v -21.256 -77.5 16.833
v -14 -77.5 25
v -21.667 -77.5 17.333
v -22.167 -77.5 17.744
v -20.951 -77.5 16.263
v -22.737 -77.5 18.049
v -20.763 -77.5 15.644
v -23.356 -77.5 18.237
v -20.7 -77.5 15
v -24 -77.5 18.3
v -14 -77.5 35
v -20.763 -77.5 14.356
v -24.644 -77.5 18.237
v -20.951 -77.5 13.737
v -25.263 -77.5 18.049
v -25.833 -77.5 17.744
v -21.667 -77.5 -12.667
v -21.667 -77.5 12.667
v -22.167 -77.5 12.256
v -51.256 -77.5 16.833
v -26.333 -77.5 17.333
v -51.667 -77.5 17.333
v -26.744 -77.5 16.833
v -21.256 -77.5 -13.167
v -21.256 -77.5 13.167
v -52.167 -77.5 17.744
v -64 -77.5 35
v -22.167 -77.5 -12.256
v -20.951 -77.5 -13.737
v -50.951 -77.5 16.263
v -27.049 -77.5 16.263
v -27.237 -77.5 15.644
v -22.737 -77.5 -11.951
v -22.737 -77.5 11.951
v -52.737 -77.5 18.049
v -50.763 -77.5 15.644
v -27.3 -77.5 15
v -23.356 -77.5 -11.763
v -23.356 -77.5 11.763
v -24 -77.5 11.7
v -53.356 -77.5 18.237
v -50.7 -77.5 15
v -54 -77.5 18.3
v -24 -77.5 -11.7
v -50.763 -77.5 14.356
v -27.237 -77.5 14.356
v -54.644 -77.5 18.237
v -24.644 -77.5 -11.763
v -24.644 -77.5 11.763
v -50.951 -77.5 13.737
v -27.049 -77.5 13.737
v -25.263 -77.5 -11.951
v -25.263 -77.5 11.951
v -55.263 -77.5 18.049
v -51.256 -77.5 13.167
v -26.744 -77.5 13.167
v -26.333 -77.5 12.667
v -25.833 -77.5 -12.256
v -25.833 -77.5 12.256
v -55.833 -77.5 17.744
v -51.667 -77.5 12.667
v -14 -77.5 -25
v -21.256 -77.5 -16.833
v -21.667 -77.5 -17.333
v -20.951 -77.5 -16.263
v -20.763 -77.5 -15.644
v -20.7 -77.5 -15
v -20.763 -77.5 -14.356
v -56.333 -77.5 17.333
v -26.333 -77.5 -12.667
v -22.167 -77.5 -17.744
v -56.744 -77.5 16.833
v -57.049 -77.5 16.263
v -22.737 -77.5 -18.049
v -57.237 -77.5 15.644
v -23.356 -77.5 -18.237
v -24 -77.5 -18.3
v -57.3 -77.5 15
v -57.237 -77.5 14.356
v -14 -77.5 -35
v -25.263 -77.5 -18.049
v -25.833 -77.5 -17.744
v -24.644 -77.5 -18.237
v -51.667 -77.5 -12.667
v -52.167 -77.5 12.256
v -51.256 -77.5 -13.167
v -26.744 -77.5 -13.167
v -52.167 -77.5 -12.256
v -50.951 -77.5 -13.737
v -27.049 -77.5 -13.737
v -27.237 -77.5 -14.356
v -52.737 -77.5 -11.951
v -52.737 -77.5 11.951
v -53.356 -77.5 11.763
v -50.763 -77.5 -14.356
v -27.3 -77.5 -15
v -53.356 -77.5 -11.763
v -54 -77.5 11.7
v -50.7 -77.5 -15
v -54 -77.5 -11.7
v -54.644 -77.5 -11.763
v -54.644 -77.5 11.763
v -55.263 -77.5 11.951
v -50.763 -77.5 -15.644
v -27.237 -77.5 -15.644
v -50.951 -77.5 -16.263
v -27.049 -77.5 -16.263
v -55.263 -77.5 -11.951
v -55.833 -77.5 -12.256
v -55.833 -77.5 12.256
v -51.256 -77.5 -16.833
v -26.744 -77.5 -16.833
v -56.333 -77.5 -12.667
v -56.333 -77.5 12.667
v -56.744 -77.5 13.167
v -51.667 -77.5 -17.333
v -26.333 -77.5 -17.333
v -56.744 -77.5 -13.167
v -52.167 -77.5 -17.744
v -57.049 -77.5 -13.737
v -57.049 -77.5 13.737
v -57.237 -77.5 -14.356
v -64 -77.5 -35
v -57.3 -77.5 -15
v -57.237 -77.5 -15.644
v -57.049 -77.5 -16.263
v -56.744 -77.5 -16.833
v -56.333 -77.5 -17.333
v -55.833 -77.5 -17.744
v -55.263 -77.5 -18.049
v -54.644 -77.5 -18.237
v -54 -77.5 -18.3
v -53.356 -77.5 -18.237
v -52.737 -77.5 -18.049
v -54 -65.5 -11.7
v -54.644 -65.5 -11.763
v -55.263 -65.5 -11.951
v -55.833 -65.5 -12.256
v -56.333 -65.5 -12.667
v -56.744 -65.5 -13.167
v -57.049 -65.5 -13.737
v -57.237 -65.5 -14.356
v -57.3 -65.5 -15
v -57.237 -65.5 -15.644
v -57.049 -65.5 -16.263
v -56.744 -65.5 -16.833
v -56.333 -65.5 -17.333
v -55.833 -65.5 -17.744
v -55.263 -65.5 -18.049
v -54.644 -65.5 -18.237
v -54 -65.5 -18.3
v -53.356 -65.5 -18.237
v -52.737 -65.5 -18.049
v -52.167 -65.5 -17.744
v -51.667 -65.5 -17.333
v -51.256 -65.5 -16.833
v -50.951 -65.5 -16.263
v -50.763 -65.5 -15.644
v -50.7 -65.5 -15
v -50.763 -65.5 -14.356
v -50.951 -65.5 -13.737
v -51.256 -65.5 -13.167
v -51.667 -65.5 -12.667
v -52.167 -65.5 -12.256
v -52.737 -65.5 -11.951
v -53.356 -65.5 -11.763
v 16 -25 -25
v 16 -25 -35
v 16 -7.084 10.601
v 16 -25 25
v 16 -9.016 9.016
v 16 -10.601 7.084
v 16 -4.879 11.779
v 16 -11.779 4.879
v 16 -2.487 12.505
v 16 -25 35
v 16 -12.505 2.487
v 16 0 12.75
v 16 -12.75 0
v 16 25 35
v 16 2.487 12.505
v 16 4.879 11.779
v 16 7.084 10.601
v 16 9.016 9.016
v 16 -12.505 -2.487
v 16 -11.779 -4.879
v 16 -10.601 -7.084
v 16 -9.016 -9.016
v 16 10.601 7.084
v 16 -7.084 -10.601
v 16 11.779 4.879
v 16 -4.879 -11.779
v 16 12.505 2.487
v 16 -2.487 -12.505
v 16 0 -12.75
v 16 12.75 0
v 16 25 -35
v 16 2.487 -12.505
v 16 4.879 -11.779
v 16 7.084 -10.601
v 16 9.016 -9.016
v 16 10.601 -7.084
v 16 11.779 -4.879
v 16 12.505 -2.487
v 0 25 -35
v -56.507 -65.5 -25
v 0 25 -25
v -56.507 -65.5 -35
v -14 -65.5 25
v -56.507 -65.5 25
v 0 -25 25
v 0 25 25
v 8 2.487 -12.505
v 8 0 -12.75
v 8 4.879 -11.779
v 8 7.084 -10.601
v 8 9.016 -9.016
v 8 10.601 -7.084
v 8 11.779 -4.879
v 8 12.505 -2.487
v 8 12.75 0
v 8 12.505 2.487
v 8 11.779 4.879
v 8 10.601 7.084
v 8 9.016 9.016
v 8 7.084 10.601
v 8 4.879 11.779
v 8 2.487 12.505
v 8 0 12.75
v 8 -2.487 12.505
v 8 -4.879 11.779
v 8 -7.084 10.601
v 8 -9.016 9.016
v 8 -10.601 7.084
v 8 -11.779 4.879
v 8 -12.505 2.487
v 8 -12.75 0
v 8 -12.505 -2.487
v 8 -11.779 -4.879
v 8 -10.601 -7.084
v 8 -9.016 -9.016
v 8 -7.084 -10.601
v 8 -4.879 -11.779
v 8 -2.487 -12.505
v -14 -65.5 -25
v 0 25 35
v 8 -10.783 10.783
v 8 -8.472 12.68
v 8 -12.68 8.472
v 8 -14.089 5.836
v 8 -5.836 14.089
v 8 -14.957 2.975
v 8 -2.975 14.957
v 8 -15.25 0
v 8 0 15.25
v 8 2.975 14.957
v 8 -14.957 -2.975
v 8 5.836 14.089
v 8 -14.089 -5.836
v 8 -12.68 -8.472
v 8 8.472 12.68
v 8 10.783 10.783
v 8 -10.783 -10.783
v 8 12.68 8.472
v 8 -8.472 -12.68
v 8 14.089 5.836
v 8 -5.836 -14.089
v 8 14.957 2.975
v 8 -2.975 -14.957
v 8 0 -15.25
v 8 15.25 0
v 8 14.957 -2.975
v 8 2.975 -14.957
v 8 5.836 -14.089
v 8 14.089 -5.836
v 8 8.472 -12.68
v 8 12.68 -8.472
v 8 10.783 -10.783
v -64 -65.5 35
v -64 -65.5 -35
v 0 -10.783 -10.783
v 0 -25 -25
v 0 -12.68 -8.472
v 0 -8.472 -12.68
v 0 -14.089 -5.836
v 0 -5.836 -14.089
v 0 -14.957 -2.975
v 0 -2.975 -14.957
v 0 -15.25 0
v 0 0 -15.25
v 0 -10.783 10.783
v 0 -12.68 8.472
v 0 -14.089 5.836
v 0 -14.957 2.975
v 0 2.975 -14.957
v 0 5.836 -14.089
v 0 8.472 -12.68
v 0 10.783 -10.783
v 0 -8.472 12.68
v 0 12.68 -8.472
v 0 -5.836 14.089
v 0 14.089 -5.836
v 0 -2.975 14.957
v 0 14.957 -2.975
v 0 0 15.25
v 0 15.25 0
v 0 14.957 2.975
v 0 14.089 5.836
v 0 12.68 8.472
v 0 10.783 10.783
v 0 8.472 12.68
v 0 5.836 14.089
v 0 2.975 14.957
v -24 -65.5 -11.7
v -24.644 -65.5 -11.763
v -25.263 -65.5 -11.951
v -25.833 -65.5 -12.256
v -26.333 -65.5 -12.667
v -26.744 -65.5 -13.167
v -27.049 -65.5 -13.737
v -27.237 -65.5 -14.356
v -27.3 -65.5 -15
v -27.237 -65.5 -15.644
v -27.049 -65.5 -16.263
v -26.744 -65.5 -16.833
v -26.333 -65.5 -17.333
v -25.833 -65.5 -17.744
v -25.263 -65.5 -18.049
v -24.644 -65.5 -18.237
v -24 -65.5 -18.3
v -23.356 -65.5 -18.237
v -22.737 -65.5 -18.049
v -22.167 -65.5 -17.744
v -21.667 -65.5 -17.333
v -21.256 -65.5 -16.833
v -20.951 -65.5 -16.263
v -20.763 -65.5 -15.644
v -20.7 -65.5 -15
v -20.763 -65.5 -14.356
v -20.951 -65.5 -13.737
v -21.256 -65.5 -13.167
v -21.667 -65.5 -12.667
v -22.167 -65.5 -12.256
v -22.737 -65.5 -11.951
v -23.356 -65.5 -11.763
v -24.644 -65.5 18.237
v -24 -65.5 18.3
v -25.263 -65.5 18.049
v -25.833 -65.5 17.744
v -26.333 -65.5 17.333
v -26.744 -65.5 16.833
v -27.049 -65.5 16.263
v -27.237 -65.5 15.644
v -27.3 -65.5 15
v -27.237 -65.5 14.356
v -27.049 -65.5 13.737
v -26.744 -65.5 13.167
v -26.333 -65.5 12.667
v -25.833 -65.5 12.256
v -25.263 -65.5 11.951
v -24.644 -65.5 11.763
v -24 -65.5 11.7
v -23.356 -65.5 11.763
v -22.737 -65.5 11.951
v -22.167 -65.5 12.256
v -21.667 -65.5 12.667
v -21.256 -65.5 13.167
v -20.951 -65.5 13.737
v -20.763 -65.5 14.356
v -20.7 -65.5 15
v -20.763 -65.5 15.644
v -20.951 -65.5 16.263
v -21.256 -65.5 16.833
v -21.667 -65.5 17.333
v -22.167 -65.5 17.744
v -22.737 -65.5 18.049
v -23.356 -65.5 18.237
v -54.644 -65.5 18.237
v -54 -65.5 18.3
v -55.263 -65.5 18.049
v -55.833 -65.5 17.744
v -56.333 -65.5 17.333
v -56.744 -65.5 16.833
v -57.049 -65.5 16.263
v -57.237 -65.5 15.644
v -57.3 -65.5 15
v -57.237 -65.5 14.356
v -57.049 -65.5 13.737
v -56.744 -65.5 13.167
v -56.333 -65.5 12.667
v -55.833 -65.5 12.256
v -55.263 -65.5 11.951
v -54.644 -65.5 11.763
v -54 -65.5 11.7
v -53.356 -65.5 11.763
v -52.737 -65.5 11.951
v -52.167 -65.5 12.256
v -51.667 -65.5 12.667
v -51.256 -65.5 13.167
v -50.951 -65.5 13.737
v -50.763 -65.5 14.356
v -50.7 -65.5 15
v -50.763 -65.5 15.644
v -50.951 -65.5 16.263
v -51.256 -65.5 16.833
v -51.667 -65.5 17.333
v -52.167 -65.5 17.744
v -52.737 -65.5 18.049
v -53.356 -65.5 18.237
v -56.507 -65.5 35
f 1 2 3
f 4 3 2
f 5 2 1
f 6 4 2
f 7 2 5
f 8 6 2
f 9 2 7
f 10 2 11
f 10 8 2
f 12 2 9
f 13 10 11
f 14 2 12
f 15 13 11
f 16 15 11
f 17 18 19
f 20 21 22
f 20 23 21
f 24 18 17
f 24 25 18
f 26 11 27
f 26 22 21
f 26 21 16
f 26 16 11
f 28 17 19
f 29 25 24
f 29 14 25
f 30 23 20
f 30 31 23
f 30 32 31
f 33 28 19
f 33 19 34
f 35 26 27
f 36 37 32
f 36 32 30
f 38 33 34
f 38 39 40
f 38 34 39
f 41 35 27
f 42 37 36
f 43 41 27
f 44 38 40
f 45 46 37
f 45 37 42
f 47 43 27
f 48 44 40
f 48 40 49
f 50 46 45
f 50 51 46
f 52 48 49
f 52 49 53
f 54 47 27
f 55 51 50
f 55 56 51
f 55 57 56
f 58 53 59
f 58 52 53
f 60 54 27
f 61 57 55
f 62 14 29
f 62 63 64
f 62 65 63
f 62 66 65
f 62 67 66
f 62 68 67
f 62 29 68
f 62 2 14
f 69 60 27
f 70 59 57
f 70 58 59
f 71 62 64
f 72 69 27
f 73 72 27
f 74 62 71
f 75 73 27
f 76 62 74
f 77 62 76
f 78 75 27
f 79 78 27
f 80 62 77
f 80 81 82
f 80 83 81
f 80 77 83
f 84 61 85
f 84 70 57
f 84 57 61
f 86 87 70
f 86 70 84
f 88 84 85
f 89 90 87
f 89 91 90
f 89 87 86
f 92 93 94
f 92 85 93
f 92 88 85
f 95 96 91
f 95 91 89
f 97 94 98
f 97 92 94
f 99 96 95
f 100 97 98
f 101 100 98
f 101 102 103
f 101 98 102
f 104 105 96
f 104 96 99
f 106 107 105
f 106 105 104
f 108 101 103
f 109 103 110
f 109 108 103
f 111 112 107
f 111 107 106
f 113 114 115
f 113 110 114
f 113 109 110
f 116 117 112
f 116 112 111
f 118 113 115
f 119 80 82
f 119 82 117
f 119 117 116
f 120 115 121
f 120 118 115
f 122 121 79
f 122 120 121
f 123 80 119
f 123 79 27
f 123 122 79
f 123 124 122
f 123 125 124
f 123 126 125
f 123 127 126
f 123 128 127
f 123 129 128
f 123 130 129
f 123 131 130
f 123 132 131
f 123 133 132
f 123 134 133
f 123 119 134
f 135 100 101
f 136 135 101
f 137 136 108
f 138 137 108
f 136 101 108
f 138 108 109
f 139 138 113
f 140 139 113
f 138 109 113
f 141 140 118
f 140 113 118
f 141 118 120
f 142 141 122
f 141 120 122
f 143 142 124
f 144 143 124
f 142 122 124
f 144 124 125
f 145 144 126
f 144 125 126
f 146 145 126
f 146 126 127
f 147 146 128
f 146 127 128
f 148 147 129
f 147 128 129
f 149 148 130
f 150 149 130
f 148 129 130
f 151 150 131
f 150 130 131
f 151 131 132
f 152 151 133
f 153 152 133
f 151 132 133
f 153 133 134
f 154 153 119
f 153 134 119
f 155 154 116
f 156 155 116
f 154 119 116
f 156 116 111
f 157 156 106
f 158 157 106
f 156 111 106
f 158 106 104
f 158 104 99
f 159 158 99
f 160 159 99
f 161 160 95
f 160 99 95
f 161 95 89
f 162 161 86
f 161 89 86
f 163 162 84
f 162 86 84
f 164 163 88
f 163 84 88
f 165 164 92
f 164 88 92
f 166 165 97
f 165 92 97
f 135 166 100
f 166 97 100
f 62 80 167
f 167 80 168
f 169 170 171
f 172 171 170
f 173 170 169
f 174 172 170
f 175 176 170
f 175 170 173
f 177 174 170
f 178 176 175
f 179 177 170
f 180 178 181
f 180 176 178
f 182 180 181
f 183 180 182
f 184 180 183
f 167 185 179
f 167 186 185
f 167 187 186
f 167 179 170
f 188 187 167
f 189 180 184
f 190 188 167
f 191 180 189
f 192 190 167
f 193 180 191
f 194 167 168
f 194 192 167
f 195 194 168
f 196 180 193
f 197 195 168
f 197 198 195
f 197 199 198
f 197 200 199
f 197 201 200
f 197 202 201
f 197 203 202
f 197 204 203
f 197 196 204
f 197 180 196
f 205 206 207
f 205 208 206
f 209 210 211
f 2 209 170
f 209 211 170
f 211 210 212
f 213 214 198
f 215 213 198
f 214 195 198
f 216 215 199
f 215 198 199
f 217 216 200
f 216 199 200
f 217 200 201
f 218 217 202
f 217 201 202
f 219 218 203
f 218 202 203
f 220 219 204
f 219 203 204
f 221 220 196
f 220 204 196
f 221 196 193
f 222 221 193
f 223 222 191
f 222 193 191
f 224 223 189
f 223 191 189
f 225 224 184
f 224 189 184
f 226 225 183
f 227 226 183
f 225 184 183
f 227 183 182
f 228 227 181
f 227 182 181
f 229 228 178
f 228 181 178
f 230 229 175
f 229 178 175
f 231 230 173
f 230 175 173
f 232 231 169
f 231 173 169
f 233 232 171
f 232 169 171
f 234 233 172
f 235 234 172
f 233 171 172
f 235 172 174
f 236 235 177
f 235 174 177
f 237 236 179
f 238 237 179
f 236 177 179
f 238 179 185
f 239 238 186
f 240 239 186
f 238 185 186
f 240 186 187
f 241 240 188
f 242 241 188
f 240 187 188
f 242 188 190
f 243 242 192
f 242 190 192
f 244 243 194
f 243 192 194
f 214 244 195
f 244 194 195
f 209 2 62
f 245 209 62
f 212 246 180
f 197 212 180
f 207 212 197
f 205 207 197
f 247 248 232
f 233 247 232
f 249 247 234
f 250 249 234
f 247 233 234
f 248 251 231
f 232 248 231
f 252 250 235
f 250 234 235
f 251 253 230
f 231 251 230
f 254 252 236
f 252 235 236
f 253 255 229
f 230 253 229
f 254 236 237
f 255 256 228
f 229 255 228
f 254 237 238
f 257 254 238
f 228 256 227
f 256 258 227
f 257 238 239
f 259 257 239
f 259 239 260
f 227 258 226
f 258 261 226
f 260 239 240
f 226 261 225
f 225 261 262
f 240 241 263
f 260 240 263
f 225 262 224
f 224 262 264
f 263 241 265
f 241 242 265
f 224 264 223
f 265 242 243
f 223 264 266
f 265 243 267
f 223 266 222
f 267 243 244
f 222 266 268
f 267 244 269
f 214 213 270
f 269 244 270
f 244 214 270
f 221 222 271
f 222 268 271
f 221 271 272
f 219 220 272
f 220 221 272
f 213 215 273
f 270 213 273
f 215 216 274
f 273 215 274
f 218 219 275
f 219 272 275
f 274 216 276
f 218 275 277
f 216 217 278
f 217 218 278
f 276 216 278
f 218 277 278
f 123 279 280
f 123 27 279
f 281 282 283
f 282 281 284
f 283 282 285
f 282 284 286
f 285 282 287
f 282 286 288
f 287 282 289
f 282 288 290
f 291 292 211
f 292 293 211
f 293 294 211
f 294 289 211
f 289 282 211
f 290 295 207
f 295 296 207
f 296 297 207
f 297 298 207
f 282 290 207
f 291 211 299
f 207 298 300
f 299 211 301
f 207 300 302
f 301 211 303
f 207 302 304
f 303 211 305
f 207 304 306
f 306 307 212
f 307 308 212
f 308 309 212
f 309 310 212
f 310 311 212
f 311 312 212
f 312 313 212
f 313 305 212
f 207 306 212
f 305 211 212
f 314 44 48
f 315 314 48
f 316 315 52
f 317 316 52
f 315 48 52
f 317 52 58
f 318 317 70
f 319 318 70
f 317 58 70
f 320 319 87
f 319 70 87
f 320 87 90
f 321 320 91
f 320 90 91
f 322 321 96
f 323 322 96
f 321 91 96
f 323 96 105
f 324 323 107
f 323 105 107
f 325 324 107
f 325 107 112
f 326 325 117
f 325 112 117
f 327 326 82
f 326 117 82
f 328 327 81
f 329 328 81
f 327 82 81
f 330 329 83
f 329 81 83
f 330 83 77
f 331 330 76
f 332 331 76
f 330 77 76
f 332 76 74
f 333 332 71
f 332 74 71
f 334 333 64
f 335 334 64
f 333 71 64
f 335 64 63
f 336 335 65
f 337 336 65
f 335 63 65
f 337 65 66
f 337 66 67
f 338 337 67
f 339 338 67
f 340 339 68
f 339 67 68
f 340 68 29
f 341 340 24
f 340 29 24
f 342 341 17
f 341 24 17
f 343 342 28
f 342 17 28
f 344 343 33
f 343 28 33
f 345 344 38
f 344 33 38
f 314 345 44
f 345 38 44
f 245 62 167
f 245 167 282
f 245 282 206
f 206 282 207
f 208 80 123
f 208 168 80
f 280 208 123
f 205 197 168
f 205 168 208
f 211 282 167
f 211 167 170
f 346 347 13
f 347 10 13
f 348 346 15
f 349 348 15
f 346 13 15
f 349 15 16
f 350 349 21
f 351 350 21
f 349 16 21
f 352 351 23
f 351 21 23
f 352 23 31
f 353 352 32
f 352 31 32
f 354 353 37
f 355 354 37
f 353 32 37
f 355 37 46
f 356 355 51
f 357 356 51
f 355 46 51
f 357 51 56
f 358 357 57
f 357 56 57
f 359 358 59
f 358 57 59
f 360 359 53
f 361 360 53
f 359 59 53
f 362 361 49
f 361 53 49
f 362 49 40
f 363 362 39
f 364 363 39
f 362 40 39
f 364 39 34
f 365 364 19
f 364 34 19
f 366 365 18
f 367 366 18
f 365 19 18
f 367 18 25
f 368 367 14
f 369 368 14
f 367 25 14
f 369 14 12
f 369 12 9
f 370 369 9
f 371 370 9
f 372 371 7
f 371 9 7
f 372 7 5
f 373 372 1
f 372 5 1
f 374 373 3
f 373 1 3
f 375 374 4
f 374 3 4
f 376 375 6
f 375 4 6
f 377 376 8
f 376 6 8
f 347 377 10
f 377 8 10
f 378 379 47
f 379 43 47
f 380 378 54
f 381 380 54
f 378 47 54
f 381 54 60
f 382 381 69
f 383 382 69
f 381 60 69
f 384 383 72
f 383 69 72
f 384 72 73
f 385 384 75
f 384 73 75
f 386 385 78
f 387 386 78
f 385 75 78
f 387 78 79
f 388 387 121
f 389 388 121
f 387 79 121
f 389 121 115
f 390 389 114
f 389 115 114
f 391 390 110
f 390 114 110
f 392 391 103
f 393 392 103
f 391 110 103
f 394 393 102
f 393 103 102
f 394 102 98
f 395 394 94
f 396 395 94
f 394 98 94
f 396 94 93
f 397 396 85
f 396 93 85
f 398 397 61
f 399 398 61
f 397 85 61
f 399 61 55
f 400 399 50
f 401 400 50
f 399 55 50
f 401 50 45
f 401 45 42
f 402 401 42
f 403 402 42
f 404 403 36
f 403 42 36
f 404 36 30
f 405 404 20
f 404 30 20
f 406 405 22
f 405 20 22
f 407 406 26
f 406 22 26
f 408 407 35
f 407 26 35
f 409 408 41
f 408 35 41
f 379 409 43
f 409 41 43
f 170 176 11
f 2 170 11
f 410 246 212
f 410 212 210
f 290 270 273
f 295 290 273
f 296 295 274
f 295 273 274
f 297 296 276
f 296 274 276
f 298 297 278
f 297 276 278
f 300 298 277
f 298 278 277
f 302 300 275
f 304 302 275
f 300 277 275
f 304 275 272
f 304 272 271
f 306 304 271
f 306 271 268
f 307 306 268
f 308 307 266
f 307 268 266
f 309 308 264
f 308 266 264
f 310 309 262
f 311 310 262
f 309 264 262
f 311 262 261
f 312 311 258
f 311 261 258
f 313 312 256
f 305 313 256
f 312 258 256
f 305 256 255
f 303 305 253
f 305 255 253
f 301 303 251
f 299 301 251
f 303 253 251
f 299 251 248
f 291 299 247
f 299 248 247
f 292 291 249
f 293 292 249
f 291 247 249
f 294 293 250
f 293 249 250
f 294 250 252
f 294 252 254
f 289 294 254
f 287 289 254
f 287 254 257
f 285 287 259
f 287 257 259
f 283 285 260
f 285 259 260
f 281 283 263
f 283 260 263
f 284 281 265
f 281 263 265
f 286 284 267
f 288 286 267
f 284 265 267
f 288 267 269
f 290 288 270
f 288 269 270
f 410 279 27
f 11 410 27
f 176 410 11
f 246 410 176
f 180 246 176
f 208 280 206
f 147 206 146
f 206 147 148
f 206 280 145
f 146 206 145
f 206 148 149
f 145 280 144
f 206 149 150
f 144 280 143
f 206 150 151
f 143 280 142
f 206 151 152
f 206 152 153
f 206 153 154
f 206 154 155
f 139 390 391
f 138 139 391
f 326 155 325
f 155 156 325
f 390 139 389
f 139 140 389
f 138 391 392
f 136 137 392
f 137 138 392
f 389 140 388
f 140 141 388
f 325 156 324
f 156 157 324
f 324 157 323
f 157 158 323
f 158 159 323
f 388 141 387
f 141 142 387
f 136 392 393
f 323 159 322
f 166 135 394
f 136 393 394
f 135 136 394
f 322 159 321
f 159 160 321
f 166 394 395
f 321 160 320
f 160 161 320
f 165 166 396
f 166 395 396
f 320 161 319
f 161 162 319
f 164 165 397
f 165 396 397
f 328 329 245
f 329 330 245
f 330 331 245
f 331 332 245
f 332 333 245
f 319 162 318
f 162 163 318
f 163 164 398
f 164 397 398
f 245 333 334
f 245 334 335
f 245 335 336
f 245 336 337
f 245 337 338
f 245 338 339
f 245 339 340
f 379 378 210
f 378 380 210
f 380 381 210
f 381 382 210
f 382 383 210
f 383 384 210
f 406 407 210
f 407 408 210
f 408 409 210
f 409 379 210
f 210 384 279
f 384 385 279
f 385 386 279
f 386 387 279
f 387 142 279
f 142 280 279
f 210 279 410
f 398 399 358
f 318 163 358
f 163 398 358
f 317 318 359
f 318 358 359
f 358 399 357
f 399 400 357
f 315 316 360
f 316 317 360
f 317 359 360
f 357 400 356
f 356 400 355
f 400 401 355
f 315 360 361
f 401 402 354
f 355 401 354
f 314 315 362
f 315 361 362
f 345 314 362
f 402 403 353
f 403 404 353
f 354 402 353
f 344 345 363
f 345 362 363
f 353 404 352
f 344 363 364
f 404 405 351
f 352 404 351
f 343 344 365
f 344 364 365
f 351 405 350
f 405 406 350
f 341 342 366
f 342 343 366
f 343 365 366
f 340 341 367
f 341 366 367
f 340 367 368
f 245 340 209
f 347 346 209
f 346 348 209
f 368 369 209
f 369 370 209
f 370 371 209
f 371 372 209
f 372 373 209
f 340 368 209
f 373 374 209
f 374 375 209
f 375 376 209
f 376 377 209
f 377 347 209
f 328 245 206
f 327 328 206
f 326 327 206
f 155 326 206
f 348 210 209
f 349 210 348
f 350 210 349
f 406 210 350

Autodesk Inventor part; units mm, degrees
ref_plane "YZ Plane" through (0, 0, 0) normal (1, 0, 0) x (0, 1, 0)
ref_plane "XZ Plane" through (0, 0, 0) normal (0, 1, 0) x (-1, 0, 0)
ref_plane "XY Plane" through (0, 0, 0) normal (0, 0, 1) x (1, 0, 0)
sketch "Sketch1" plane through (0, 0, 0) normal (1, 0, 0) x (0, 1, 0)
  line L0 (-25, 35) -> (25, 35)
  line L1 (25, 35) -> (25, -35)
  line L2 (25, -35) -> (-25, -35)
  line L3 (-25, -35) -> (-25, 35)
  line L4 (-25, 35) -> (25, -35) construction
  line L5 (25, 35) -> (-25, -35) construction
  point P0 (0, 0)
  dimension "d0" = 50
  dimension "d1" = 70
extrude "Extrusion1" add sketch "Sketch1" along normal blind 16
sketch "Sketch2" plane through (16, 0, 0) normal (1, 0, 0) x (0, 0, -1)
  circle A0 centre (0, 0) radius 15.25
  dimension "d4" = 30.5
extrude "Extrusion2" cut sketch "Sketch2" against normal through all
sketch "Sketch3" plane through (16, 0, 0) normal (1, 0, 0) x (0, 0, -1)
  circle A0 centre (0, 0) radius 15.25
  circle A1 centre (0, 0) radius 12.75
  dimension "d7" = 25.5
extrude "Extrusion3" add sketch "Sketch3" against normal blind 8
sketch "Sketch4" plane through (0, -25, 35) normal (0, 0, 1) x (1, 0, 0)
  line L0 (0, 50) -> (0, 0)
  line L1 (0, 0) -> (16, 0)
  line L2 (16, 50) -> (16, 0)
  line L3 (0, 50) -> (16, 50)
  line L4 (16, 37.75) -> (16, 12.25)
  line L5 (8, 12.25) -> (8, 37.75)
  line L6 (16, 37.75) -> (16, 12.25)
  line L7 (16, 50) -> (-64, 50)
  line L8 (-64, 50) -> (-64, -52.5)
  line L9 (-64, -52.5) -> (16, -52.5)
  line L10 (16, -52.5) -> (16, 50)
  line L11 (0, 50) -> (-64, -52.5)
  line L12 (16, 0) -> (-14, -52.5)
  point P0 (0, 25)
  point P1 (8, 25)
  dimension "d10" = 77.5
  dimension "d11" = 80
  dimension "d12" = 50
extrude "Extrusion4" add sketch "Sketch4" against normal blind 10 contours L0 L1 L12 L9 L11
mirror "Mirror1" about plane through (0, 0, 0) normal (0, 0, 1) of "Extrusion4"
sketch "Sketch5" plane through (-64, -77.5, 35) normal (0, -1, 0) x (1, 0, 0)
  line L0 (0, 0) -> (50, 0)
  line L1 (0, 0) -> (0, -10)
  line L2 (50, -10) -> (0, -10)
  line L3 (50, 0) -> (50, -10)
  line L4 (0, -70) -> (50, -70)
  line L5 (50, -70) -> (50, -60)
  line L6 (50, -60) -> (0, -60)
  line L7 (0, -70) -> (0, -60)
  line L8 (0, 0) -> (50, 0)
  line L9 (50, 0) -> (50, -70)
  line L10 (50, -70) -> (0, -70)
  line L11 (0, -70) -> (0, 0)
  point P0 (64, -35)
extrude "Extrusion5" add sketch "Sketch5" against normal blind 12
sketch "Sketch6" plane through (-64, -65.5, 35) normal (0, 1, 0) x (1, 0, 0)
  line L0 (50, 10) -> (7.4927, 10)
  line L1 (50, 10) -> (50, 60)
  line L2 (7.4927, 60) -> (50, 60)
  line L3 (7.4927, 70) -> (7.4927, 60)
  line L4 (7.4927, 70) -> (0, 70)
  line L5 (0, 70) -> (0, 0)
  line L6 (0, 0) -> (7.4927, 0)
  line L7 (7.4927, 10) -> (7.4927, 0)
  line L8 (64, 70) -> (7.4927, 70)
  line L9 (64, 70) -> (80, 70)
  line L10 (50, 70) -> (80, 70)
  line L11 (0, 70) -> (50, 70)
  line L12 (7.4927, 70) -> (0, 70)
  line L13 (50, 0) -> (80, 0)
  line L14 (64, 0) -> (80, 0)
  line L15 (64, 0) -> (7.4927, 0)
  line L16 (0, 0) -> (7.4927, 0)
  line L17 (0, 0) -> (50, 0)
  line L18 (50, 0) -> (0, 70) construction
  line L19 (50, 70) -> (0, 0) construction
  line L20 (10, 20) -> (40, 20) construction
  line L21 (40, 20) -> (40, 50) construction
  line L22 (40, 50) -> (10, 50) construction
  line L23 (10, 50) -> (10, 20) construction
  line L24 (10, 20) -> (40, 50) construction
  line L25 (40, 20) -> (10, 50) construction
  point P0 (64, 35)
  point P1 (25, 35)
  dimension "d17" = 30
  dimension "d18" = 30
hole "Hole1" at (-24, -65.5, -15) at (-54, -65.5, -15) at (-54, -65.5, 15) at (-24, -65.5, 15) direction (0, -1, 0) diameter 6.6 end through all
properties part number "Part15_3DPrint"
